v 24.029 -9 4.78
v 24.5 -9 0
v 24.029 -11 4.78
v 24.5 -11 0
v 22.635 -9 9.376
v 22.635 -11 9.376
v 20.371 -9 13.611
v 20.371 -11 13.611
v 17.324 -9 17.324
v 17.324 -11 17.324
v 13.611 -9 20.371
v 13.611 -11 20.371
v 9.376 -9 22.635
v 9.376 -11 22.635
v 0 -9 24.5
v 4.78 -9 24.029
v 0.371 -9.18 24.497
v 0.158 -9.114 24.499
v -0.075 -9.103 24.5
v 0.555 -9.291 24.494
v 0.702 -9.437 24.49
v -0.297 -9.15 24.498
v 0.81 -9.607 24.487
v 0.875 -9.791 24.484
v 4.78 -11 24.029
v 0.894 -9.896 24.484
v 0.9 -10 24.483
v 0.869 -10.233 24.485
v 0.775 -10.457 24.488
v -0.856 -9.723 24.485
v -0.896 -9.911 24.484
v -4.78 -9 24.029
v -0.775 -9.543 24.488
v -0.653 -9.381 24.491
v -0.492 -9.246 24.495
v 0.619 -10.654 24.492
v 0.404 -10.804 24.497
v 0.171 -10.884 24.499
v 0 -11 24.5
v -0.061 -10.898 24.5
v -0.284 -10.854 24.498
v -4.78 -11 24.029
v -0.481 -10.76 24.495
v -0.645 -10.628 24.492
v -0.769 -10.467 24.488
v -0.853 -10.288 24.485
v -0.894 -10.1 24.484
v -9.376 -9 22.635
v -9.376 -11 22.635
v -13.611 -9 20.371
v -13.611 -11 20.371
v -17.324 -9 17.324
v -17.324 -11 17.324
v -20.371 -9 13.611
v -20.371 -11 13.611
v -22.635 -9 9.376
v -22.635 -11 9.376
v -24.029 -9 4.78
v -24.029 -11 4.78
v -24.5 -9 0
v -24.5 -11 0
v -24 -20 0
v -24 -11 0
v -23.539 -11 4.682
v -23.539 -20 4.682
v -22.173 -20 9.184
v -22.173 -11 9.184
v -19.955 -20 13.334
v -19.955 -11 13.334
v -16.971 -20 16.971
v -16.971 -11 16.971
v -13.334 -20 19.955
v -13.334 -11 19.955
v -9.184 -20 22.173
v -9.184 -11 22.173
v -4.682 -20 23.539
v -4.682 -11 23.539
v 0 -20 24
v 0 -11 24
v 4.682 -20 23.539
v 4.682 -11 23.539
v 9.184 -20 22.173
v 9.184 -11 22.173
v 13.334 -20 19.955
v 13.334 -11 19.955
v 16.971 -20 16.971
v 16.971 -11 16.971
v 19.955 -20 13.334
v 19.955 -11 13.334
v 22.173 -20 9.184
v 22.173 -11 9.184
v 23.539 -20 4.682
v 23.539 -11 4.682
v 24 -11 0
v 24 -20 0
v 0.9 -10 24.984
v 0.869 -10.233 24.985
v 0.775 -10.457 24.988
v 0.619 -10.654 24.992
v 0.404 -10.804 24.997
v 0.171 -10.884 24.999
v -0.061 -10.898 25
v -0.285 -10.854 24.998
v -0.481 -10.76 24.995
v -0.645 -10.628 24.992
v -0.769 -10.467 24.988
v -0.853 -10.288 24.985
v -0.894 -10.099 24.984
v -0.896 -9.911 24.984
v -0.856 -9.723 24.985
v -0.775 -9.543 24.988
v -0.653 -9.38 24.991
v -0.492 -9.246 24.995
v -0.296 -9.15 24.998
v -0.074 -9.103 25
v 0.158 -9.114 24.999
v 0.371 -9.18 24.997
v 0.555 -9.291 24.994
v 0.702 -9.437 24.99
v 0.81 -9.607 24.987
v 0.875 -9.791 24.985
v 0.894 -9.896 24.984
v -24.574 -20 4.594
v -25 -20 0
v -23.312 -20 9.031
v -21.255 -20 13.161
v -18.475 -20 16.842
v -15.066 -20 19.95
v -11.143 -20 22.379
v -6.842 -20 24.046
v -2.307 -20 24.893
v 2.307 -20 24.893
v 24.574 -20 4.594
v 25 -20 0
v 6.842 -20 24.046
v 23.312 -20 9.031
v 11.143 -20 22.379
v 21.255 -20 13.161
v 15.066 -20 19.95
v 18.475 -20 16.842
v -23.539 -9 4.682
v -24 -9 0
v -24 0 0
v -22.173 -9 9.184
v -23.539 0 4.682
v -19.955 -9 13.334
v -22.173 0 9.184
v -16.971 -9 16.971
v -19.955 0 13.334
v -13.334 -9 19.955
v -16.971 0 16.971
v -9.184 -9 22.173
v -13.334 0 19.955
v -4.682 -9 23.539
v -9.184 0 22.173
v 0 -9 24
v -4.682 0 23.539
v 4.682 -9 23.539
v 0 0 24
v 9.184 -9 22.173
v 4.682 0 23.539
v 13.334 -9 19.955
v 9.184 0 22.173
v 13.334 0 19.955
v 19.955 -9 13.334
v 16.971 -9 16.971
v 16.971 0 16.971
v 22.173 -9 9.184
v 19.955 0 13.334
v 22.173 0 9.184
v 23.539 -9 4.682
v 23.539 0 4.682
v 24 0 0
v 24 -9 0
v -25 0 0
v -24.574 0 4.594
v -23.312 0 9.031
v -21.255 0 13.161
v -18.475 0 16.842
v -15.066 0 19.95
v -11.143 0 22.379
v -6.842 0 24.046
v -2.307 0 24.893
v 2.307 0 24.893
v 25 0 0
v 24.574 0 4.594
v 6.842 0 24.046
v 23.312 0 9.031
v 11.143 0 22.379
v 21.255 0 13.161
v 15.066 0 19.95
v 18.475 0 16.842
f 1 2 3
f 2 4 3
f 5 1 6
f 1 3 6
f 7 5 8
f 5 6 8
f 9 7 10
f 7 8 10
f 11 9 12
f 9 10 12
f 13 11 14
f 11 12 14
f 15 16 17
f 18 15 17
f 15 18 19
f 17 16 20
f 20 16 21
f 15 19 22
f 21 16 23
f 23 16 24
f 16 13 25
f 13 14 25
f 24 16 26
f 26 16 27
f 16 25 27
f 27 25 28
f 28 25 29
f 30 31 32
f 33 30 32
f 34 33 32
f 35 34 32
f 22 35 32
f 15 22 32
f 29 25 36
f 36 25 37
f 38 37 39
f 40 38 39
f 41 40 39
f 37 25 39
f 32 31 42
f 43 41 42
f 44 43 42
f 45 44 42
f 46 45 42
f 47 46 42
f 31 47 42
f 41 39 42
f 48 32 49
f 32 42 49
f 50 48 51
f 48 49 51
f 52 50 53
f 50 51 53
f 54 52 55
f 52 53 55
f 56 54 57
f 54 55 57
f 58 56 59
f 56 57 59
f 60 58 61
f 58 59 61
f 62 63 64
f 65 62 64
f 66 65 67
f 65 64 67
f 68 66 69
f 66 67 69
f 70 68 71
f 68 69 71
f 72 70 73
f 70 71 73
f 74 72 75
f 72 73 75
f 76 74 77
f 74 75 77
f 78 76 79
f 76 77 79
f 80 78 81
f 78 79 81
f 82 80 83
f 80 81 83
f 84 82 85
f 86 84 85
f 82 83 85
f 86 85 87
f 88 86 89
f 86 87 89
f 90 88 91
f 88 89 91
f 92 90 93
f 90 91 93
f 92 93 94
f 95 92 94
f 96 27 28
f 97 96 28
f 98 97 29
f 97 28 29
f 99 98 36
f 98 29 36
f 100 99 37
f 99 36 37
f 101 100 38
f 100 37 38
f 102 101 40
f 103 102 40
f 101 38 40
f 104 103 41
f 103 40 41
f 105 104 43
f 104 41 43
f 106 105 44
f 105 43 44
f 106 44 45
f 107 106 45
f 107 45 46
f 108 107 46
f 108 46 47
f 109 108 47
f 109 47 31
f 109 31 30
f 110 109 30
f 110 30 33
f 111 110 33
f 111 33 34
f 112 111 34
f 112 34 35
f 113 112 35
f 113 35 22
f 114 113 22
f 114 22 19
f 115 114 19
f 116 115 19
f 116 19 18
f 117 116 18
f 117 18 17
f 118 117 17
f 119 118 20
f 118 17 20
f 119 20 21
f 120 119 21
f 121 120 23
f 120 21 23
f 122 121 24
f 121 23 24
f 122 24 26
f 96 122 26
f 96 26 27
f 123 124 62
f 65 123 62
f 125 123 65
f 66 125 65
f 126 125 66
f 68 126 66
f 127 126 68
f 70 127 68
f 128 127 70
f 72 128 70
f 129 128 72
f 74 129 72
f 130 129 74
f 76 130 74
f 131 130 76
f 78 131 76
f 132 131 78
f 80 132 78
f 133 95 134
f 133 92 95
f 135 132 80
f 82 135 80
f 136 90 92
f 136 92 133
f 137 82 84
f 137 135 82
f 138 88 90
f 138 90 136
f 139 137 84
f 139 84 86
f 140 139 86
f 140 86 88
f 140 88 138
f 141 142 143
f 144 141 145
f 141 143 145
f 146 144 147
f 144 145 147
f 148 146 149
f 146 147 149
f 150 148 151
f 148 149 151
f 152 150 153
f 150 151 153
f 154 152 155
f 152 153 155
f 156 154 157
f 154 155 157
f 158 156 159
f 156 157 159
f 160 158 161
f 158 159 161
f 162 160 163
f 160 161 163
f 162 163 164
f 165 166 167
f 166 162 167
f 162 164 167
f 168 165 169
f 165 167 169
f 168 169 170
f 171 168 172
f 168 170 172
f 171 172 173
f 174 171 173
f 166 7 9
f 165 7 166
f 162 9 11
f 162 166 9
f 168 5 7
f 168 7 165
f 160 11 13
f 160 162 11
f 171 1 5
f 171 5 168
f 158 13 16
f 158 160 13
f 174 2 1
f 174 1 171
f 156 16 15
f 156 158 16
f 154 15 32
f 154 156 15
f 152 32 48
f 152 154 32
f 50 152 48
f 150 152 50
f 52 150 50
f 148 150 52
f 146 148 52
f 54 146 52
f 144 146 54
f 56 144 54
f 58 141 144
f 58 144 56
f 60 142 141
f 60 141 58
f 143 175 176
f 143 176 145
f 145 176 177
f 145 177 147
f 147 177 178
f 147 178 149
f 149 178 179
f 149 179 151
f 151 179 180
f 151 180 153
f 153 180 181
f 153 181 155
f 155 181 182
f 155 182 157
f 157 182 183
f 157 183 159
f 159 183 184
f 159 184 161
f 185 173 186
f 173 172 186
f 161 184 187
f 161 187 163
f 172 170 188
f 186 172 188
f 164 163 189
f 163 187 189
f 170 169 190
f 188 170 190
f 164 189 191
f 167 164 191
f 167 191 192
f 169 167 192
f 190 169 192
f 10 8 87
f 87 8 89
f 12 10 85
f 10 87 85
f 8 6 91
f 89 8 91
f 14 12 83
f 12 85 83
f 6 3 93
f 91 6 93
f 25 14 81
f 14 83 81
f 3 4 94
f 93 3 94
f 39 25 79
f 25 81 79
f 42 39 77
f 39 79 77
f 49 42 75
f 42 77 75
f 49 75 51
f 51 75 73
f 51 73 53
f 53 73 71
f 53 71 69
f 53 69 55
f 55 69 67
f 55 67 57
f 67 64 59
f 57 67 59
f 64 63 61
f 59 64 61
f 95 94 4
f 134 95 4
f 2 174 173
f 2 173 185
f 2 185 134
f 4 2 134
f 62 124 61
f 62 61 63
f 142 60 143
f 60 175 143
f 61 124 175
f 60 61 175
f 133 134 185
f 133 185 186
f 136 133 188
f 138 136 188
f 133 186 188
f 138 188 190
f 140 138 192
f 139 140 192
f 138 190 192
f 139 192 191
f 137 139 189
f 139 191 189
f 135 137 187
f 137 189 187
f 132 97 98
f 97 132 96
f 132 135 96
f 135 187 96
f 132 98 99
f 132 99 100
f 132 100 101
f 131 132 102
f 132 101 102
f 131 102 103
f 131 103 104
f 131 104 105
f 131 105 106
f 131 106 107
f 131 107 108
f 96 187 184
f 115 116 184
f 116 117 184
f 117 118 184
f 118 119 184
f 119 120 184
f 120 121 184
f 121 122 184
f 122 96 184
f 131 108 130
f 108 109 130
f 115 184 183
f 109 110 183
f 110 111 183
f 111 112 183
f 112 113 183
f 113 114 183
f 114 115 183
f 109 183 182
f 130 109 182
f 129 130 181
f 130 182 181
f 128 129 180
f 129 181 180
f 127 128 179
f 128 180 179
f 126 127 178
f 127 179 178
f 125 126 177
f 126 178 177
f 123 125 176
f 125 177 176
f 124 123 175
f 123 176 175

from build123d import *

# Parameters (mm, degrees)
F1_DEPTH = 20
F2_W     = 0.5
F2_H     = 2
F4_R     = 0.9
F5_DEPTH = 25.001


with BuildPart() as f1:
    # F0 (on Front) → F1 (new body)
    with BuildSketch(Plane.XZ):
        with BuildLine():
            Line((24, 0), (25, 0))
            ThreePointArc((25, 0), (0, 25), (-25, 0))
            Line((-25, 0), (-24, 0))
            ThreePointArc((-24, 0), (0, 24), (24, 0))
        make_face()
    extrude(amount=F1_DEPTH)

    # F2 (on face) → F3 (revolve, cut)
    with BuildSketch(Plane(origin=(0, 0, 0), x_dir=(1, 0, 0), z_dir=(0, 0, -1))):
        with Locations((-24.25, 10)):
            Rectangle(F2_W, F2_H)
    revolve(axis=Axis((0, -6.667699, 0), (0, -1, 0)), mode=Mode.SUBTRACT)

    # F4 (on face) → F5 (cut, through all)
    with BuildSketch(Plane(origin=(0, 0, 0), x_dir=(1, 0, 0), z_dir=(0, 0, -1))):
        with Locations((0, 10)):
            Circle(F4_R)
    extrude(amount=-F5_DEPTH, mode=Mode.SUBTRACT)


solid = f1.part
